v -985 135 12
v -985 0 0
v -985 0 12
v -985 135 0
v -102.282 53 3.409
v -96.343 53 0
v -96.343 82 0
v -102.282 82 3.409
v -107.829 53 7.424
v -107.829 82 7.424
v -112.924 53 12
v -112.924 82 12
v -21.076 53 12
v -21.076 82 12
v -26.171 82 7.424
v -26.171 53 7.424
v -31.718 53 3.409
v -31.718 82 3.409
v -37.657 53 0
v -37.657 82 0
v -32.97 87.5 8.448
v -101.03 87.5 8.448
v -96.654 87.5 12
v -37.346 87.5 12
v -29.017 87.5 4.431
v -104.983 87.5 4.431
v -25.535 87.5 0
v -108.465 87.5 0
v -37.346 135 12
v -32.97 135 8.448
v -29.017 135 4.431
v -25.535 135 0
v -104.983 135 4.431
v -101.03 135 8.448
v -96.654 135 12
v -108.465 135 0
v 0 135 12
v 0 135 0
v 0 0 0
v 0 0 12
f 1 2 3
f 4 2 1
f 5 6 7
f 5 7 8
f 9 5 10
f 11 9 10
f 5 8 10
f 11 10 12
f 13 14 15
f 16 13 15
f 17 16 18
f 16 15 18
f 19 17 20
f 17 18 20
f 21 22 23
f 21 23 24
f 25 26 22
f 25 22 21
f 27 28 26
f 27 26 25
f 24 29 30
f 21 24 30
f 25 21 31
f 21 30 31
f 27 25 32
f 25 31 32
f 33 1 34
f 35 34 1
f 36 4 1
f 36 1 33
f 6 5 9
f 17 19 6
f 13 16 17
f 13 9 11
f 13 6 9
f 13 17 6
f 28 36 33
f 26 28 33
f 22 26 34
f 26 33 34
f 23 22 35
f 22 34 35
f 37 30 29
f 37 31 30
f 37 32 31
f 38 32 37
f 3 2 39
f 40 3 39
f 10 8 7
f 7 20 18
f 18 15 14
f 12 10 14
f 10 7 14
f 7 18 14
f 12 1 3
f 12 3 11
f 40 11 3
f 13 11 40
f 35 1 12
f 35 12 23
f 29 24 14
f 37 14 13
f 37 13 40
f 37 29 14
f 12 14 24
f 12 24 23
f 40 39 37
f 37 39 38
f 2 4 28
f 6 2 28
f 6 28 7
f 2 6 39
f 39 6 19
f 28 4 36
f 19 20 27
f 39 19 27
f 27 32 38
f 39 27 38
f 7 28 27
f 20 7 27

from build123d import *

# Parameters (mm, degrees)
CROQUIS1_W              = 985
CROQUIS1_H              = 135
SALIENTE_EXTRUIR1_DEPTH = 12
CORTAR_EXTRUIR1_DEPTH   = 47.5
CROQUIS3_R              = 65
CORTAR_EXTRUIR2_DEPTH   = 29


with BuildPart() as part:
    # Croquis1 → Saliente-Extruir1 (new body)
    with BuildSketch(Plane.XY):
        with Locations((-492.5, 67.5)):
            Rectangle(CROQUIS1_W, CROQUIS1_H)
    extrude(amount=SALIENTE_EXTRUIR1_DEPTH)

    # Croquis2 → Cortar-Extruir1 (cut)
    with BuildSketch(Plane(origin=(0, 135, 0), x_dir=(1, 0, 0), z_dir=(0, 1, 0))):
        with BuildLine():
            Line((-25.534833896, 0), (-108.465166104, 0))
            ThreePointArc((-108.465166104, 0), (-103.062225626, -6.494730354), (-96.654004789, -12))
            Line((-96.654004789, -12), (-37.345995211, -12))
            ThreePointArc((-37.345995211, -12), (-30.937774374, -6.494730354), (-25.534833896, 0))
        make_face()
    extrude(amount=-CORTAR_EXTRUIR1_DEPTH, mode=Mode.SUBTRACT)

    # Croquis3 → Cortar-Extruir2 (cut)
    with BuildSketch(Plane(origin=(0, 82, 0), x_dir=(1, 0, 0), z_dir=(0, 1, 0))):
        with Locations((-67, -58)):
            Circle(CROQUIS3_R)
    extrude(amount=-CORTAR_EXTRUIR2_DEPTH, mode=Mode.SUBTRACT)


solid = part.part
